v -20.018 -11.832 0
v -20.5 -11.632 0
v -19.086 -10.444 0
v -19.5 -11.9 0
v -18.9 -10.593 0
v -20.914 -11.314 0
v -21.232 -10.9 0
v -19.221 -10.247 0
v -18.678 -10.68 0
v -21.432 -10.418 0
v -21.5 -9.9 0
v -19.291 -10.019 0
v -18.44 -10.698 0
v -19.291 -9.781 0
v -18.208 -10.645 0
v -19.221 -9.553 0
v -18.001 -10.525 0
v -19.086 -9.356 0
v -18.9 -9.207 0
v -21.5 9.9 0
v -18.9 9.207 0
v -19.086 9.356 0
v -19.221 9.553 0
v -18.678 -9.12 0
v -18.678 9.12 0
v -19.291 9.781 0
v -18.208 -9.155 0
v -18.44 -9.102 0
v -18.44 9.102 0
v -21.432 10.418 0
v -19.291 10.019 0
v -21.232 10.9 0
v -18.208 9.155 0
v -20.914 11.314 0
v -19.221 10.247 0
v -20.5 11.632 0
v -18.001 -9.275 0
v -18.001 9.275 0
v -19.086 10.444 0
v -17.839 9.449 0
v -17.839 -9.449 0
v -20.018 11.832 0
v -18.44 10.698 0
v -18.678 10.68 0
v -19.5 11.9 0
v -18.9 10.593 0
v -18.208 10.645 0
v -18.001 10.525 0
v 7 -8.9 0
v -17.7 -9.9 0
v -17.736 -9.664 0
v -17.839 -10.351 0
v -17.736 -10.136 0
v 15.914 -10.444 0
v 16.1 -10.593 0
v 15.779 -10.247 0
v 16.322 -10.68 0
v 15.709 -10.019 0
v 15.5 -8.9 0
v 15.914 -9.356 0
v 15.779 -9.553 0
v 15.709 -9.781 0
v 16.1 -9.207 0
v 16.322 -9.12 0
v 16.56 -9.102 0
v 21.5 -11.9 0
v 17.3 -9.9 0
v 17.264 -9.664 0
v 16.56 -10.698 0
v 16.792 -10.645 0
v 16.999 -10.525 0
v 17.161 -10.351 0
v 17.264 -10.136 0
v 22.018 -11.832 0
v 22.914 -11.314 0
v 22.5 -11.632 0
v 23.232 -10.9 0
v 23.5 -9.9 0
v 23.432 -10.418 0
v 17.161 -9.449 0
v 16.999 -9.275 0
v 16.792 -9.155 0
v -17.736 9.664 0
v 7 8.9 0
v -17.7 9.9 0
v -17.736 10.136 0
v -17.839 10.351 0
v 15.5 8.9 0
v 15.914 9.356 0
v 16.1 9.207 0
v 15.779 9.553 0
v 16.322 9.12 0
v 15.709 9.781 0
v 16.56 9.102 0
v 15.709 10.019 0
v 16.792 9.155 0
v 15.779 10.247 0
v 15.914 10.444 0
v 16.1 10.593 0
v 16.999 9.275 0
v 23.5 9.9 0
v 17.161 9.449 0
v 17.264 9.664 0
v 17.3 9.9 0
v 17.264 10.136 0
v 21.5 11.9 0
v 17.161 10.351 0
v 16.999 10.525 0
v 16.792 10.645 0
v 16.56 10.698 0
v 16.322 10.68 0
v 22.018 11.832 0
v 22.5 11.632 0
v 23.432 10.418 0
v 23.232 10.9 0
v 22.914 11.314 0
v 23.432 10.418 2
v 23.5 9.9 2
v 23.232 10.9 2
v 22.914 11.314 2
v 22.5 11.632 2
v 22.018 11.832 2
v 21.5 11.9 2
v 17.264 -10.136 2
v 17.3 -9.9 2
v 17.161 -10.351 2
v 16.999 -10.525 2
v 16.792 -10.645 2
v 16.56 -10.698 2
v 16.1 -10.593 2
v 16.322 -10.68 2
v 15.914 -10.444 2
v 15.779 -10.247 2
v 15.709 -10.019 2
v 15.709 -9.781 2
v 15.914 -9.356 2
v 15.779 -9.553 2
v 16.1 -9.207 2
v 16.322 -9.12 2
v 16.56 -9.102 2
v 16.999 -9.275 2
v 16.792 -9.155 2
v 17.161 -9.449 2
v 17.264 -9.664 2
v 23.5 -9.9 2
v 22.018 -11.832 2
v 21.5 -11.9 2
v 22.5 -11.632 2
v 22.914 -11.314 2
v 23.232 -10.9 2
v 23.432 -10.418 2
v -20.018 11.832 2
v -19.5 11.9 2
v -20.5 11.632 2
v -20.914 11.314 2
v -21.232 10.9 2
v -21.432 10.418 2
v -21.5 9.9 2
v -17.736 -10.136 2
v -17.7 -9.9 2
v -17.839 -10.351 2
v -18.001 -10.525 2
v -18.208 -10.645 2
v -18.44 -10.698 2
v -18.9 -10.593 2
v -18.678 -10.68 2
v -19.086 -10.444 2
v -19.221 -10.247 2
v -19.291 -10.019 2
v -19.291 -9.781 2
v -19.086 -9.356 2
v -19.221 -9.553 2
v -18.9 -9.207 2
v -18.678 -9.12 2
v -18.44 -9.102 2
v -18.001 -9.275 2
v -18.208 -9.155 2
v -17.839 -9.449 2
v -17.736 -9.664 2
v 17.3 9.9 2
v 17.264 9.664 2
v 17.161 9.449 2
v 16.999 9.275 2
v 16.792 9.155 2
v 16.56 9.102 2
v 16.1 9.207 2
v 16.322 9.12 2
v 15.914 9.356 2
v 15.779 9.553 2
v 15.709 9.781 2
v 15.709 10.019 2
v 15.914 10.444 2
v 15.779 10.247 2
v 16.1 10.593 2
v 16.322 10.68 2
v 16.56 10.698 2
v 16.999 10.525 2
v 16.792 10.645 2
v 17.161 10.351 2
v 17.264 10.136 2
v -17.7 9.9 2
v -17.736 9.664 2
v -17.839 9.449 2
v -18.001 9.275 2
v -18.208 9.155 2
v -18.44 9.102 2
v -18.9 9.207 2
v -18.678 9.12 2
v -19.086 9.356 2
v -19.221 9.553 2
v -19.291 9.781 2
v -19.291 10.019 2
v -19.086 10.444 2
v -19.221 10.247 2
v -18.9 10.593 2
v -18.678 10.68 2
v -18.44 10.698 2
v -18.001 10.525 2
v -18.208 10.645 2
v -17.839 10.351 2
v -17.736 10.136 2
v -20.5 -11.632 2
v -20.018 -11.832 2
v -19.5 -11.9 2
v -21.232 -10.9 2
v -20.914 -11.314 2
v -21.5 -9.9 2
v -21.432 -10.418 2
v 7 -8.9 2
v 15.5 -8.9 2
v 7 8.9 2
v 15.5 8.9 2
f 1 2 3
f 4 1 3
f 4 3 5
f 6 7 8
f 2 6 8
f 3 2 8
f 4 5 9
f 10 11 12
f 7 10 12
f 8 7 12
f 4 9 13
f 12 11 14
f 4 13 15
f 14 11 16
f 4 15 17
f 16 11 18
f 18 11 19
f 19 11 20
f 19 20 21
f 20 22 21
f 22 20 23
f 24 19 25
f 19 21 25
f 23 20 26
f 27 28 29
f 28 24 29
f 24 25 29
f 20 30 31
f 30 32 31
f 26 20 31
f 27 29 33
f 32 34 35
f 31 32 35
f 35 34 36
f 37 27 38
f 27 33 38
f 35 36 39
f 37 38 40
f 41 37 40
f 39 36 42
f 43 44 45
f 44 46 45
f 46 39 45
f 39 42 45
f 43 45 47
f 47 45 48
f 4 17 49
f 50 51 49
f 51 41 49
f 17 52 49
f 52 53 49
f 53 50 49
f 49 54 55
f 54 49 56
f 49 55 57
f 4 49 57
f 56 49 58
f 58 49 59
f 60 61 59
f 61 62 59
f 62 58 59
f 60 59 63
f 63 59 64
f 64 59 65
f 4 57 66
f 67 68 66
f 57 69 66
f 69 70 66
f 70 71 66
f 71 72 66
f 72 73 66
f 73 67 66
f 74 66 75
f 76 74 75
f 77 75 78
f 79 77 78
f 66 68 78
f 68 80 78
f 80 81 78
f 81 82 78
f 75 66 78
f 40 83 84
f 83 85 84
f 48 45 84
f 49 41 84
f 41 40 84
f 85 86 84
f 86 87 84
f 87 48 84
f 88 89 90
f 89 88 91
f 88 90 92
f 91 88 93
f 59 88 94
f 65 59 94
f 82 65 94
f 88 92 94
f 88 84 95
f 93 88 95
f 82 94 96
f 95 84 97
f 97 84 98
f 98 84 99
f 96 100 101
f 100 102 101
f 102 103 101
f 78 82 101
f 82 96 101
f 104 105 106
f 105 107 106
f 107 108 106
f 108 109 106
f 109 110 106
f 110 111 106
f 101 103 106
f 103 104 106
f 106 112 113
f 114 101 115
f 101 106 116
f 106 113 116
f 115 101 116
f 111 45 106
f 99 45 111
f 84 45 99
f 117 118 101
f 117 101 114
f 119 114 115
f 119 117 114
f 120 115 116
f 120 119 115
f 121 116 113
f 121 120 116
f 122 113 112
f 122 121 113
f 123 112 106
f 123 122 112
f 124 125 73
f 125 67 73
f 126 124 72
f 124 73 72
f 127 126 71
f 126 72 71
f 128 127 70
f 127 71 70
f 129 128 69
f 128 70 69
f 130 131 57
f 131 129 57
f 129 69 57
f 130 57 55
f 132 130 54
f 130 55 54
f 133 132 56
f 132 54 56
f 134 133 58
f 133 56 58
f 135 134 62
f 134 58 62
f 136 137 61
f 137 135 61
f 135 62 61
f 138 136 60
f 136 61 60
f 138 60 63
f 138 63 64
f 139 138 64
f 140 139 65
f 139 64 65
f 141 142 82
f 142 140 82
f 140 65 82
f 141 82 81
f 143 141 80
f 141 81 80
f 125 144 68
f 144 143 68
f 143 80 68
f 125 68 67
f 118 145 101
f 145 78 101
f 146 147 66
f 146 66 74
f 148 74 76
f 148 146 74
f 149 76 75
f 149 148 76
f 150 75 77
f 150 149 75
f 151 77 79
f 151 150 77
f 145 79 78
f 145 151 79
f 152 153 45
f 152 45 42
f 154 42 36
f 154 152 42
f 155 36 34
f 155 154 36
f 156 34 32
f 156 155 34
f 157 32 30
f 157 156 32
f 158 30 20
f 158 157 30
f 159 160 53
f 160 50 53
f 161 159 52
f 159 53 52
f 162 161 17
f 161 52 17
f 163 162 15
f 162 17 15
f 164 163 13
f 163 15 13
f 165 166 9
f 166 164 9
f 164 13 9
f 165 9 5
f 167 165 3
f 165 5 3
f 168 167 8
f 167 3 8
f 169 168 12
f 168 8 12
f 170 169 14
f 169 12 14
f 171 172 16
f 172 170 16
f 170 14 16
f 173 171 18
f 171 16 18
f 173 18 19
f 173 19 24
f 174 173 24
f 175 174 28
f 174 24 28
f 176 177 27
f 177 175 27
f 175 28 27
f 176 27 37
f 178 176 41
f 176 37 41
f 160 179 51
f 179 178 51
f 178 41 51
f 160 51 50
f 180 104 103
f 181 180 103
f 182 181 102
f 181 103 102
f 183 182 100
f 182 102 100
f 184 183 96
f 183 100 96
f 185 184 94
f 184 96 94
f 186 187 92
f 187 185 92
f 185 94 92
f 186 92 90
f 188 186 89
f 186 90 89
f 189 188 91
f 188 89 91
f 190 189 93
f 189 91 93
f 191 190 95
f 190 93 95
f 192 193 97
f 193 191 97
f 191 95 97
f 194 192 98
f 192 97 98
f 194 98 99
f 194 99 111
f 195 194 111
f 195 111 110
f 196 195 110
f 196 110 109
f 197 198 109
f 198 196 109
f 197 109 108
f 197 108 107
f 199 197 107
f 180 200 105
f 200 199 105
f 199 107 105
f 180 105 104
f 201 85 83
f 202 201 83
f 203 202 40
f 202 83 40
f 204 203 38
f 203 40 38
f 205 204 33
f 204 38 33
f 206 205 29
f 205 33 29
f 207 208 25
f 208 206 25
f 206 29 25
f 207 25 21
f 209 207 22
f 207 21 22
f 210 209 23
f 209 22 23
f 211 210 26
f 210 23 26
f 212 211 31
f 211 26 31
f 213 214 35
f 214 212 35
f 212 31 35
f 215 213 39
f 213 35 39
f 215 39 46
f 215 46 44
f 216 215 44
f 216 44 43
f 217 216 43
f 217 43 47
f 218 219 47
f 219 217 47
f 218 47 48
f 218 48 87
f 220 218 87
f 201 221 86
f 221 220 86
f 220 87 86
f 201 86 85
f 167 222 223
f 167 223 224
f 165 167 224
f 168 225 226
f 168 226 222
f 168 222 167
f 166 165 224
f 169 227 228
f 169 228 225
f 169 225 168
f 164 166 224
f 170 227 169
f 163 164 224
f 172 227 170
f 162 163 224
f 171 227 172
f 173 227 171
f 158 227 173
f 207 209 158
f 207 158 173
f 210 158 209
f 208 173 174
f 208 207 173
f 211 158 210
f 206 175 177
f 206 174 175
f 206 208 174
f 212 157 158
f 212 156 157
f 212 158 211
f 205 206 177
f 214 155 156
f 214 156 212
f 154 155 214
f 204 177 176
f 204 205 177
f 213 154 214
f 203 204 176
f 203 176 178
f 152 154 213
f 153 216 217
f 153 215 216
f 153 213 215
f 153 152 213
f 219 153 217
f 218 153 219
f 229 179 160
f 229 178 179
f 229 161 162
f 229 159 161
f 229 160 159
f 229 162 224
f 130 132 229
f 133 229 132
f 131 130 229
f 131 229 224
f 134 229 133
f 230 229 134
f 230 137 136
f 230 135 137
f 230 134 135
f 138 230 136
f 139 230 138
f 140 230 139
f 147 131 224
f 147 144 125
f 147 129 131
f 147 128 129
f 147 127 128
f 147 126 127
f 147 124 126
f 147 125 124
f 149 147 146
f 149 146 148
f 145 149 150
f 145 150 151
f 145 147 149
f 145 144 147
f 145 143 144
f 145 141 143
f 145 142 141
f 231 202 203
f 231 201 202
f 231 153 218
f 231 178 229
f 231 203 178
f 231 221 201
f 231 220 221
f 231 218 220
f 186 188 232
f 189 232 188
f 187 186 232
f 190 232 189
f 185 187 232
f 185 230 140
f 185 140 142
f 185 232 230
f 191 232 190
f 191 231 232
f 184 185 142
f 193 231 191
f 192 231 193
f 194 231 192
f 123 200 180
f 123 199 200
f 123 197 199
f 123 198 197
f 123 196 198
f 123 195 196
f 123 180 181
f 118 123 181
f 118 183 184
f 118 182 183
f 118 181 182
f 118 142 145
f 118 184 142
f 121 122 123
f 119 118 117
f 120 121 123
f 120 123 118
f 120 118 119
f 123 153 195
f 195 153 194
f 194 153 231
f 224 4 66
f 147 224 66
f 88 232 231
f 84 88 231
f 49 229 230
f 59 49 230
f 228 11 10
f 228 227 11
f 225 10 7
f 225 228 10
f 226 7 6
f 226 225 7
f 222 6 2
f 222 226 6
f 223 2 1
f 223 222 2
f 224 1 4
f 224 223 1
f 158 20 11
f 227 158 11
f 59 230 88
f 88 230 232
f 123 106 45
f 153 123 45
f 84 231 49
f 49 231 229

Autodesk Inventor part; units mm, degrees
ref_plane "YZ Plane" through (0, 0, 0) normal (1, 0, 0) x (0, 1, 0)
ref_plane "XZ Plane" through (0, 0, 0) normal (0, 1, 0) x (-1, 0, 0)
ref_plane "XY Plane" through (0, 0, 0) normal (0, 0, 1) x (1, 0, 0)
ref_plane "作業平面1" through (0, 0, 0) normal (0, 0, 1) x (1, 0, 0)
sketch "スケッチ1" plane through (0, 0, 0) normal (0, 0, 1) x (1, 0, 0)
  circle A0 centre (16.5, -9.9) radius 0.8 projected
  circle A1 centre (-18.5, 9.9) radius 0.8 projected
  circle A2 centre (16.5, 9.9) radius 0.8 projected
  circle A3 centre (-18.5, -9.9) radius 0.8 projected
  arc A4 (-21.5, -7.9) -> (-23.5, -9.9) centre (-21.5, -9.9) ccw projected
  line L0 (-23.5, -9.9) -> (-23.5, -11.9) projected
  line L1 (-23.5, -11.9) -> (23.5, -11.9) projected
  line L2 (23.5, -11.9) -> (23.5, 11.9) projected
  line L3 (23.5, 11.9) -> (-23.5, 11.9) projected
  line L4 (-23.5, 11.9) -> (-23.5, 9.9) projected
  arc A5 (-23.5, 9.9) -> (-21.5, 7.9) centre (-21.5, 9.9) ccw projected
  line L5 (-21.5, 7.9) -> (21.5, 7.9) projected
  line L6 (21.5, 7.9) -> (21.5, -7.9) projected
  line L7 (21.5, -7.9) -> (-21.5, -7.9) projected
  line L8 (-21.5, 11.9) -> (-21.5, -11.9)
  point P0 (0, 0)
ref_plane "作業平面2" through (0, 0, 0) normal (0, 0, 1) x (1, 0, 0)
extrude "押し出し1" add sketch "スケッチ1" along normal blind 2 contours L8 L5 L6 L7 | L7 L6 L5 L8 L3 L2 L1
fillet "フィレット1" radius 2 4 edges at (23.5, 11.9, 1) (23.5, -11.9, 1) (-21.5, -11.9, 1) (-21.5, 11.9, 1)
sketch "スケッチ2" plane through (0, 0, 2) normal (0, 0, 1) x (1, 0, 0)
  line L0 (15.5, 8.9) -> (7, 8.9)
  line L1 (7, 8.9) -> (7, -8.9)
  line L2 (7, -8.9) -> (15.5, -8.9)
  line L3 (15.5, -8.9) -> (15.5, 8.9)
  circle A0 centre (16.5, 9.9) radius 0.8 projected
  circle A1 centre (16.5, -9.9) radius 0.8 projected
  point P0 (0, 0)
  dimension "d3" = 1
  dimension "d4" = 8.5
  dimension "d5" = 1
  dimension "d6" = 1
extrude "押し出し2" cut sketch "スケッチ2" against normal up to surface (2 mm away) contours L3 L2 L1 L0
properties part number "STlink_Top"
